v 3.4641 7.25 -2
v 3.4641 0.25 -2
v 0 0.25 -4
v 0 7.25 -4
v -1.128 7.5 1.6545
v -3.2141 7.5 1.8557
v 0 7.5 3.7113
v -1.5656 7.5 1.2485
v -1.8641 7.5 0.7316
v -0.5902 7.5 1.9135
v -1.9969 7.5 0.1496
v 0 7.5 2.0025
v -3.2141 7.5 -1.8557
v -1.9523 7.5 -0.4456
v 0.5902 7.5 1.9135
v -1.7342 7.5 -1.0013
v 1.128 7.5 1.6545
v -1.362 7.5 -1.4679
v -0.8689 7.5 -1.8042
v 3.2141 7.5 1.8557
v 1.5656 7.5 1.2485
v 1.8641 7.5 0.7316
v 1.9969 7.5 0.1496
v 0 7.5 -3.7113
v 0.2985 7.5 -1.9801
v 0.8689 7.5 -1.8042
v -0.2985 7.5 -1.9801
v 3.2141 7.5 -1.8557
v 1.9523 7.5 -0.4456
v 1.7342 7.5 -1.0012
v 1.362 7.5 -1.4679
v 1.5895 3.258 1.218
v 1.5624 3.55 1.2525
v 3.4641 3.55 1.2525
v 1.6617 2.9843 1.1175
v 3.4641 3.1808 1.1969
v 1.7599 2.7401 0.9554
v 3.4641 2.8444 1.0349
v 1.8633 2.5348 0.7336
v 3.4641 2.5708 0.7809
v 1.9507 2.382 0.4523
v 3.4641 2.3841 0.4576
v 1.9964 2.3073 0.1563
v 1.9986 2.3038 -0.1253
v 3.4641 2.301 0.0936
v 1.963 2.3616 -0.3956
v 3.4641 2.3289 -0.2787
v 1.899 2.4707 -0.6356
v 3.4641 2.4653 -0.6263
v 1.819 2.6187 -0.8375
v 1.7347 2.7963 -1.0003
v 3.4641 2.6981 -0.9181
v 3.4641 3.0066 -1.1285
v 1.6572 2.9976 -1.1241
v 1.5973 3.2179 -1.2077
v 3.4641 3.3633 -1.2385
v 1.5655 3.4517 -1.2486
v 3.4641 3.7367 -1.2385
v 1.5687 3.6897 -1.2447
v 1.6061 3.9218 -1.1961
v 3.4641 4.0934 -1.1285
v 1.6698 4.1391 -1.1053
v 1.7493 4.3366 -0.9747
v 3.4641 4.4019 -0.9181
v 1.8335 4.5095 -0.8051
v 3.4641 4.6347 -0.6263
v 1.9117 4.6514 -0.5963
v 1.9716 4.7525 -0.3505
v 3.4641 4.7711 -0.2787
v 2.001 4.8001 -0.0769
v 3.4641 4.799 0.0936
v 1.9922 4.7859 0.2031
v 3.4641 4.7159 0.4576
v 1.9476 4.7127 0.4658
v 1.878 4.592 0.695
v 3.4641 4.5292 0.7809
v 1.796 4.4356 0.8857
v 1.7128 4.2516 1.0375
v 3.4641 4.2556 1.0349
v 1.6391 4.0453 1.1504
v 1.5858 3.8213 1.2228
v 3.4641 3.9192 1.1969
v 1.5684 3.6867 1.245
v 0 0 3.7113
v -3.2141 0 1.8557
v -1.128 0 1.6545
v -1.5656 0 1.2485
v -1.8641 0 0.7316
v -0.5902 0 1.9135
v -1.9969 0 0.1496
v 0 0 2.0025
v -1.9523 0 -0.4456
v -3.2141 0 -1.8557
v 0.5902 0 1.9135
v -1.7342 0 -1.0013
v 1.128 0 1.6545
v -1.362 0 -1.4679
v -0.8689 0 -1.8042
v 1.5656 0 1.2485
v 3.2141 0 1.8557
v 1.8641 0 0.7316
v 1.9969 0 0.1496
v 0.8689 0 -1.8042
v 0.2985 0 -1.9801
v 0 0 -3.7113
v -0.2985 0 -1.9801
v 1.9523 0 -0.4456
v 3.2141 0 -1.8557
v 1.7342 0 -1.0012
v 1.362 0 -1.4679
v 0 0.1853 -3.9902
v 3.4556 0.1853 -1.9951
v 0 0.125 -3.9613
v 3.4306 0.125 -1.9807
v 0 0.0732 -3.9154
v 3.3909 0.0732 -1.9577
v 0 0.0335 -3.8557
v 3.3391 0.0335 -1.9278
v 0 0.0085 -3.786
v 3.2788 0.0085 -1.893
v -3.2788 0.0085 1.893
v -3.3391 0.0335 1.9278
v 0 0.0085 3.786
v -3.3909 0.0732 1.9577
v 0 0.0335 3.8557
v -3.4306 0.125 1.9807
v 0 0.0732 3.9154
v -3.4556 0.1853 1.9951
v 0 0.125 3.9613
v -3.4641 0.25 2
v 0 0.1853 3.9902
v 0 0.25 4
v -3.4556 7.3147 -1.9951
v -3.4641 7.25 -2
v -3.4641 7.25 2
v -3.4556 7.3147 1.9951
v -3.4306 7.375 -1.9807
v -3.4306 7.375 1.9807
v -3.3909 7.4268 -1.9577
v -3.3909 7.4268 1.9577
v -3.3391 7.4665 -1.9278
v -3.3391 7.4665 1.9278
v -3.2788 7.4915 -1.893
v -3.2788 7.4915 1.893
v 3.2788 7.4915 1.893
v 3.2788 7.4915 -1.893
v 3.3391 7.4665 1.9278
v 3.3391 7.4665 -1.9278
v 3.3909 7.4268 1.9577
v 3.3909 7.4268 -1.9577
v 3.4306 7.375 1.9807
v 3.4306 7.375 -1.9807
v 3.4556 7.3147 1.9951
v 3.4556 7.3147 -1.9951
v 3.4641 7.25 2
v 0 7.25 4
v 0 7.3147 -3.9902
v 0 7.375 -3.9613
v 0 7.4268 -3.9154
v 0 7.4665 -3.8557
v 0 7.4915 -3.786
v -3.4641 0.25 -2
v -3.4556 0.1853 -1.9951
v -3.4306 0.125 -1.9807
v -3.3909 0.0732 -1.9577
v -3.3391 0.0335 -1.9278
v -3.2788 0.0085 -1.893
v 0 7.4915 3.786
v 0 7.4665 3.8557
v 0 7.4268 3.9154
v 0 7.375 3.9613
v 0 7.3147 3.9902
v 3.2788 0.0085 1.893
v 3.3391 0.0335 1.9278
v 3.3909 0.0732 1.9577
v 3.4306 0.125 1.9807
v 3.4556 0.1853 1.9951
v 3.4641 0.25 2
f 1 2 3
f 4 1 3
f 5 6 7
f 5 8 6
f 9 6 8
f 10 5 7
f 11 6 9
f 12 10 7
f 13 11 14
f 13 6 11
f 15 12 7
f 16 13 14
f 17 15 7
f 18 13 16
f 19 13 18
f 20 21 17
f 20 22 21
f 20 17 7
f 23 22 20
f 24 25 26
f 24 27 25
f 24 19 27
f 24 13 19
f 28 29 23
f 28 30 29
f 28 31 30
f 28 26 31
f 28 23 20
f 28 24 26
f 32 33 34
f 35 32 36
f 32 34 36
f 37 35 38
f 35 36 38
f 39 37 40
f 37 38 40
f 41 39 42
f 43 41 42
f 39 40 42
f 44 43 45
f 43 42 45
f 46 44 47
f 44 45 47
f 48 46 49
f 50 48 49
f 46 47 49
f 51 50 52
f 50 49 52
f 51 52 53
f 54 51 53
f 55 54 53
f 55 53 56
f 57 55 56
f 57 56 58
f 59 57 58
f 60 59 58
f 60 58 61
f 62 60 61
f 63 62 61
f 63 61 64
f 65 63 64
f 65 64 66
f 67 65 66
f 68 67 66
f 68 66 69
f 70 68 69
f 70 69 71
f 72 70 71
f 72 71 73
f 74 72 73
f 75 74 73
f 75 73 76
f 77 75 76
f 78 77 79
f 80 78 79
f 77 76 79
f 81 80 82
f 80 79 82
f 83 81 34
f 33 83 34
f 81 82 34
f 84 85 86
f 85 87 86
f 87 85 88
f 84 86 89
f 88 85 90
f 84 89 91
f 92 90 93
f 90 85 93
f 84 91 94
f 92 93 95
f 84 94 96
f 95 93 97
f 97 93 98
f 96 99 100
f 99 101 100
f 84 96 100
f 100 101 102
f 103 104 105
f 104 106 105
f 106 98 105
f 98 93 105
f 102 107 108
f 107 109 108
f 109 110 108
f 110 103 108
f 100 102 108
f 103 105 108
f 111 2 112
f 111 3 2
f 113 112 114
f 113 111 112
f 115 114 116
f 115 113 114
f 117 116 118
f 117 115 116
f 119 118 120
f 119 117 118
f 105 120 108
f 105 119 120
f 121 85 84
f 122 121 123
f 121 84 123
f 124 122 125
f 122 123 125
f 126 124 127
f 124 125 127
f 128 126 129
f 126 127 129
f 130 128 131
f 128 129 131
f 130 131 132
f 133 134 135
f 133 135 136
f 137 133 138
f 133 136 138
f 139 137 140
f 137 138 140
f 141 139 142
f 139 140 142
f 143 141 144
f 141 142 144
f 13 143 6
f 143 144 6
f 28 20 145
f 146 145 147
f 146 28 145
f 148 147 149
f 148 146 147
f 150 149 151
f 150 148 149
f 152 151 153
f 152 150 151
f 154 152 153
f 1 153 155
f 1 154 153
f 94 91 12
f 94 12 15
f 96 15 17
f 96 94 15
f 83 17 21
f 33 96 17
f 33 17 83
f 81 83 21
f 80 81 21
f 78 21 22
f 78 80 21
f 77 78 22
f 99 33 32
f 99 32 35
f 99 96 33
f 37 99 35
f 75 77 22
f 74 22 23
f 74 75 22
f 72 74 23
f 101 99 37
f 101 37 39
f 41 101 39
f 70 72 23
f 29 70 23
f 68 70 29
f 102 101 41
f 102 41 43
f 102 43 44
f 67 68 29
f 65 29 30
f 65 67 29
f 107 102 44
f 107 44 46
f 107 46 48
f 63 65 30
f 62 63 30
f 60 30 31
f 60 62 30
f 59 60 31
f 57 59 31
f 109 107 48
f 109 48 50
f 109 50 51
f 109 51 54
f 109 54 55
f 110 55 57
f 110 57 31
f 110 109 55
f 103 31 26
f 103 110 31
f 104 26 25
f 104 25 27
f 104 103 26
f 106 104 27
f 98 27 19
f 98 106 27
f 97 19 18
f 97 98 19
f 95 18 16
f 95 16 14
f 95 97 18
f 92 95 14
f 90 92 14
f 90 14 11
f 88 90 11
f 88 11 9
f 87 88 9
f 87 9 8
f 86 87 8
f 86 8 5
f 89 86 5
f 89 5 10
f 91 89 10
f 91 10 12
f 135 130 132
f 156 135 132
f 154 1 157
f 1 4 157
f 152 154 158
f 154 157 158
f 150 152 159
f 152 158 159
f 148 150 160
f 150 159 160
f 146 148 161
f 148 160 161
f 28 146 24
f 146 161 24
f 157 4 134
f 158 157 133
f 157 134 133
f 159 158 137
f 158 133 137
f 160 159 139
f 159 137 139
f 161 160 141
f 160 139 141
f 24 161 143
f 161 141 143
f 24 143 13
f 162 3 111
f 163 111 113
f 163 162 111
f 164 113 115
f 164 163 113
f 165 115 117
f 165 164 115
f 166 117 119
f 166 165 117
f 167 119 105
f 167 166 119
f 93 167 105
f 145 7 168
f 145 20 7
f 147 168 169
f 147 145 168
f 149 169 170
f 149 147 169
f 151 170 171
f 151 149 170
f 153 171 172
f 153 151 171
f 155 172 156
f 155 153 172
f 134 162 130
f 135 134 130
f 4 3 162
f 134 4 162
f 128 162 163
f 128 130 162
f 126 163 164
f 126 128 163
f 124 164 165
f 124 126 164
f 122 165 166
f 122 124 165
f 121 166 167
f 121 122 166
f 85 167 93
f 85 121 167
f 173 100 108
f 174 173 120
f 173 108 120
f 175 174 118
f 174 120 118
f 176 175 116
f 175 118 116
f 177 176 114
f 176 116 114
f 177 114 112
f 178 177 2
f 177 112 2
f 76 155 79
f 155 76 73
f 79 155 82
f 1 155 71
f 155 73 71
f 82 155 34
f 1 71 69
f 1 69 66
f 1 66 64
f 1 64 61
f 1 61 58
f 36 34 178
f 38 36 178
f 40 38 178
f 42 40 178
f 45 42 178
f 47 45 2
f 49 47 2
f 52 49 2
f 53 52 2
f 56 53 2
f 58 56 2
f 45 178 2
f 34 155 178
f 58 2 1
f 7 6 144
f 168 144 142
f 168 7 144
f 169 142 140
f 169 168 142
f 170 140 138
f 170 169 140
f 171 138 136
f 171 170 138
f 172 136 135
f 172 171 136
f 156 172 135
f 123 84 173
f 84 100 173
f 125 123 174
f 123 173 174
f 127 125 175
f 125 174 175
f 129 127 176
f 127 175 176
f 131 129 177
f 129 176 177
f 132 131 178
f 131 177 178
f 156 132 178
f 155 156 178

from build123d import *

# Parameters (mm, degrees)
SKETCH1_R                  = 2.0025
BOSS_EXTRUDE1_DEPTH        = 7.5
M3X0_5_TAPPED_HOLE1_REACH  = 10.922
M3X0_5_TAPPED_HOLE1_BORE_R = 1.2525
FILLET1_R                  = 0.25


with BuildPart() as part:
    # Sketch1 → Boss-Extrude1 (new body)
    with BuildSketch(Plane(origin=(0, 0, 0), x_dir=(1, 0, 0), z_dir=(0, 1, 0))):
        Polygon((0, 4), (-3.464101615, 2), (-3.464101615, -2), (0, -4), (3.464101615, -2), (3.464101615, 2), align=None)
        with Locations(Location((0, 0, 0), (0, 0, 270))):
            Circle(SKETCH1_R, mode=Mode.SUBTRACT)
    extrude(amount=BOSS_EXTRUDE1_DEPTH)

    # M3x0.5 Tapped Hole1 bore (on position points) → M3x0.5 Tapped Hole1 (cut, up to next)
    with BuildSketch(Plane(origin=(3.464101615, 3.55, 0), x_dir=(0, 0, 1), z_dir=(1, 0, 0)), mode=Mode.PRIVATE) as m3x0_5_tapped_hole1_sk1:
        Circle(M3X0_5_TAPPED_HOLE1_BORE_R)
    m3x0_5_tapped_hole1_tool1 = extrude(m3x0_5_tapped_hole1_sk1.sketch, amount=-M3X0_5_TAPPED_HOLE1_REACH, mode=Mode.PRIVATE) & part.part
    add(m3x0_5_tapped_hole1_tool1.solids().sort_by_distance((3.464102, 3.55, 0))[0], mode=Mode.SUBTRACT)

    # Fillet1
    fillet1_edges = [part.edges().sort_by_distance(p)[0] for p in [
        (-3.464101615, 7.5, 0),
        (-1.732050808, 7.5, 3),
        (1.732050808, 7.5, 3),
        (3.464101615, 7.5, 0),
        (1.732050808, 7.5, -3),
        (3.464101615, 0, 0),
        (1.732050808, 0, 3),
        (-1.732050808, 0, 3),
        (-1.732050808, 7.5, -3),
        (-3.464101615, 0, 0),
        (-1.732050808, 0, -3),
        (1.732050808, 0, -3),
    ]]
    fillet(fillet1_edges, radius=FILLET1_R)


solid = part.part
